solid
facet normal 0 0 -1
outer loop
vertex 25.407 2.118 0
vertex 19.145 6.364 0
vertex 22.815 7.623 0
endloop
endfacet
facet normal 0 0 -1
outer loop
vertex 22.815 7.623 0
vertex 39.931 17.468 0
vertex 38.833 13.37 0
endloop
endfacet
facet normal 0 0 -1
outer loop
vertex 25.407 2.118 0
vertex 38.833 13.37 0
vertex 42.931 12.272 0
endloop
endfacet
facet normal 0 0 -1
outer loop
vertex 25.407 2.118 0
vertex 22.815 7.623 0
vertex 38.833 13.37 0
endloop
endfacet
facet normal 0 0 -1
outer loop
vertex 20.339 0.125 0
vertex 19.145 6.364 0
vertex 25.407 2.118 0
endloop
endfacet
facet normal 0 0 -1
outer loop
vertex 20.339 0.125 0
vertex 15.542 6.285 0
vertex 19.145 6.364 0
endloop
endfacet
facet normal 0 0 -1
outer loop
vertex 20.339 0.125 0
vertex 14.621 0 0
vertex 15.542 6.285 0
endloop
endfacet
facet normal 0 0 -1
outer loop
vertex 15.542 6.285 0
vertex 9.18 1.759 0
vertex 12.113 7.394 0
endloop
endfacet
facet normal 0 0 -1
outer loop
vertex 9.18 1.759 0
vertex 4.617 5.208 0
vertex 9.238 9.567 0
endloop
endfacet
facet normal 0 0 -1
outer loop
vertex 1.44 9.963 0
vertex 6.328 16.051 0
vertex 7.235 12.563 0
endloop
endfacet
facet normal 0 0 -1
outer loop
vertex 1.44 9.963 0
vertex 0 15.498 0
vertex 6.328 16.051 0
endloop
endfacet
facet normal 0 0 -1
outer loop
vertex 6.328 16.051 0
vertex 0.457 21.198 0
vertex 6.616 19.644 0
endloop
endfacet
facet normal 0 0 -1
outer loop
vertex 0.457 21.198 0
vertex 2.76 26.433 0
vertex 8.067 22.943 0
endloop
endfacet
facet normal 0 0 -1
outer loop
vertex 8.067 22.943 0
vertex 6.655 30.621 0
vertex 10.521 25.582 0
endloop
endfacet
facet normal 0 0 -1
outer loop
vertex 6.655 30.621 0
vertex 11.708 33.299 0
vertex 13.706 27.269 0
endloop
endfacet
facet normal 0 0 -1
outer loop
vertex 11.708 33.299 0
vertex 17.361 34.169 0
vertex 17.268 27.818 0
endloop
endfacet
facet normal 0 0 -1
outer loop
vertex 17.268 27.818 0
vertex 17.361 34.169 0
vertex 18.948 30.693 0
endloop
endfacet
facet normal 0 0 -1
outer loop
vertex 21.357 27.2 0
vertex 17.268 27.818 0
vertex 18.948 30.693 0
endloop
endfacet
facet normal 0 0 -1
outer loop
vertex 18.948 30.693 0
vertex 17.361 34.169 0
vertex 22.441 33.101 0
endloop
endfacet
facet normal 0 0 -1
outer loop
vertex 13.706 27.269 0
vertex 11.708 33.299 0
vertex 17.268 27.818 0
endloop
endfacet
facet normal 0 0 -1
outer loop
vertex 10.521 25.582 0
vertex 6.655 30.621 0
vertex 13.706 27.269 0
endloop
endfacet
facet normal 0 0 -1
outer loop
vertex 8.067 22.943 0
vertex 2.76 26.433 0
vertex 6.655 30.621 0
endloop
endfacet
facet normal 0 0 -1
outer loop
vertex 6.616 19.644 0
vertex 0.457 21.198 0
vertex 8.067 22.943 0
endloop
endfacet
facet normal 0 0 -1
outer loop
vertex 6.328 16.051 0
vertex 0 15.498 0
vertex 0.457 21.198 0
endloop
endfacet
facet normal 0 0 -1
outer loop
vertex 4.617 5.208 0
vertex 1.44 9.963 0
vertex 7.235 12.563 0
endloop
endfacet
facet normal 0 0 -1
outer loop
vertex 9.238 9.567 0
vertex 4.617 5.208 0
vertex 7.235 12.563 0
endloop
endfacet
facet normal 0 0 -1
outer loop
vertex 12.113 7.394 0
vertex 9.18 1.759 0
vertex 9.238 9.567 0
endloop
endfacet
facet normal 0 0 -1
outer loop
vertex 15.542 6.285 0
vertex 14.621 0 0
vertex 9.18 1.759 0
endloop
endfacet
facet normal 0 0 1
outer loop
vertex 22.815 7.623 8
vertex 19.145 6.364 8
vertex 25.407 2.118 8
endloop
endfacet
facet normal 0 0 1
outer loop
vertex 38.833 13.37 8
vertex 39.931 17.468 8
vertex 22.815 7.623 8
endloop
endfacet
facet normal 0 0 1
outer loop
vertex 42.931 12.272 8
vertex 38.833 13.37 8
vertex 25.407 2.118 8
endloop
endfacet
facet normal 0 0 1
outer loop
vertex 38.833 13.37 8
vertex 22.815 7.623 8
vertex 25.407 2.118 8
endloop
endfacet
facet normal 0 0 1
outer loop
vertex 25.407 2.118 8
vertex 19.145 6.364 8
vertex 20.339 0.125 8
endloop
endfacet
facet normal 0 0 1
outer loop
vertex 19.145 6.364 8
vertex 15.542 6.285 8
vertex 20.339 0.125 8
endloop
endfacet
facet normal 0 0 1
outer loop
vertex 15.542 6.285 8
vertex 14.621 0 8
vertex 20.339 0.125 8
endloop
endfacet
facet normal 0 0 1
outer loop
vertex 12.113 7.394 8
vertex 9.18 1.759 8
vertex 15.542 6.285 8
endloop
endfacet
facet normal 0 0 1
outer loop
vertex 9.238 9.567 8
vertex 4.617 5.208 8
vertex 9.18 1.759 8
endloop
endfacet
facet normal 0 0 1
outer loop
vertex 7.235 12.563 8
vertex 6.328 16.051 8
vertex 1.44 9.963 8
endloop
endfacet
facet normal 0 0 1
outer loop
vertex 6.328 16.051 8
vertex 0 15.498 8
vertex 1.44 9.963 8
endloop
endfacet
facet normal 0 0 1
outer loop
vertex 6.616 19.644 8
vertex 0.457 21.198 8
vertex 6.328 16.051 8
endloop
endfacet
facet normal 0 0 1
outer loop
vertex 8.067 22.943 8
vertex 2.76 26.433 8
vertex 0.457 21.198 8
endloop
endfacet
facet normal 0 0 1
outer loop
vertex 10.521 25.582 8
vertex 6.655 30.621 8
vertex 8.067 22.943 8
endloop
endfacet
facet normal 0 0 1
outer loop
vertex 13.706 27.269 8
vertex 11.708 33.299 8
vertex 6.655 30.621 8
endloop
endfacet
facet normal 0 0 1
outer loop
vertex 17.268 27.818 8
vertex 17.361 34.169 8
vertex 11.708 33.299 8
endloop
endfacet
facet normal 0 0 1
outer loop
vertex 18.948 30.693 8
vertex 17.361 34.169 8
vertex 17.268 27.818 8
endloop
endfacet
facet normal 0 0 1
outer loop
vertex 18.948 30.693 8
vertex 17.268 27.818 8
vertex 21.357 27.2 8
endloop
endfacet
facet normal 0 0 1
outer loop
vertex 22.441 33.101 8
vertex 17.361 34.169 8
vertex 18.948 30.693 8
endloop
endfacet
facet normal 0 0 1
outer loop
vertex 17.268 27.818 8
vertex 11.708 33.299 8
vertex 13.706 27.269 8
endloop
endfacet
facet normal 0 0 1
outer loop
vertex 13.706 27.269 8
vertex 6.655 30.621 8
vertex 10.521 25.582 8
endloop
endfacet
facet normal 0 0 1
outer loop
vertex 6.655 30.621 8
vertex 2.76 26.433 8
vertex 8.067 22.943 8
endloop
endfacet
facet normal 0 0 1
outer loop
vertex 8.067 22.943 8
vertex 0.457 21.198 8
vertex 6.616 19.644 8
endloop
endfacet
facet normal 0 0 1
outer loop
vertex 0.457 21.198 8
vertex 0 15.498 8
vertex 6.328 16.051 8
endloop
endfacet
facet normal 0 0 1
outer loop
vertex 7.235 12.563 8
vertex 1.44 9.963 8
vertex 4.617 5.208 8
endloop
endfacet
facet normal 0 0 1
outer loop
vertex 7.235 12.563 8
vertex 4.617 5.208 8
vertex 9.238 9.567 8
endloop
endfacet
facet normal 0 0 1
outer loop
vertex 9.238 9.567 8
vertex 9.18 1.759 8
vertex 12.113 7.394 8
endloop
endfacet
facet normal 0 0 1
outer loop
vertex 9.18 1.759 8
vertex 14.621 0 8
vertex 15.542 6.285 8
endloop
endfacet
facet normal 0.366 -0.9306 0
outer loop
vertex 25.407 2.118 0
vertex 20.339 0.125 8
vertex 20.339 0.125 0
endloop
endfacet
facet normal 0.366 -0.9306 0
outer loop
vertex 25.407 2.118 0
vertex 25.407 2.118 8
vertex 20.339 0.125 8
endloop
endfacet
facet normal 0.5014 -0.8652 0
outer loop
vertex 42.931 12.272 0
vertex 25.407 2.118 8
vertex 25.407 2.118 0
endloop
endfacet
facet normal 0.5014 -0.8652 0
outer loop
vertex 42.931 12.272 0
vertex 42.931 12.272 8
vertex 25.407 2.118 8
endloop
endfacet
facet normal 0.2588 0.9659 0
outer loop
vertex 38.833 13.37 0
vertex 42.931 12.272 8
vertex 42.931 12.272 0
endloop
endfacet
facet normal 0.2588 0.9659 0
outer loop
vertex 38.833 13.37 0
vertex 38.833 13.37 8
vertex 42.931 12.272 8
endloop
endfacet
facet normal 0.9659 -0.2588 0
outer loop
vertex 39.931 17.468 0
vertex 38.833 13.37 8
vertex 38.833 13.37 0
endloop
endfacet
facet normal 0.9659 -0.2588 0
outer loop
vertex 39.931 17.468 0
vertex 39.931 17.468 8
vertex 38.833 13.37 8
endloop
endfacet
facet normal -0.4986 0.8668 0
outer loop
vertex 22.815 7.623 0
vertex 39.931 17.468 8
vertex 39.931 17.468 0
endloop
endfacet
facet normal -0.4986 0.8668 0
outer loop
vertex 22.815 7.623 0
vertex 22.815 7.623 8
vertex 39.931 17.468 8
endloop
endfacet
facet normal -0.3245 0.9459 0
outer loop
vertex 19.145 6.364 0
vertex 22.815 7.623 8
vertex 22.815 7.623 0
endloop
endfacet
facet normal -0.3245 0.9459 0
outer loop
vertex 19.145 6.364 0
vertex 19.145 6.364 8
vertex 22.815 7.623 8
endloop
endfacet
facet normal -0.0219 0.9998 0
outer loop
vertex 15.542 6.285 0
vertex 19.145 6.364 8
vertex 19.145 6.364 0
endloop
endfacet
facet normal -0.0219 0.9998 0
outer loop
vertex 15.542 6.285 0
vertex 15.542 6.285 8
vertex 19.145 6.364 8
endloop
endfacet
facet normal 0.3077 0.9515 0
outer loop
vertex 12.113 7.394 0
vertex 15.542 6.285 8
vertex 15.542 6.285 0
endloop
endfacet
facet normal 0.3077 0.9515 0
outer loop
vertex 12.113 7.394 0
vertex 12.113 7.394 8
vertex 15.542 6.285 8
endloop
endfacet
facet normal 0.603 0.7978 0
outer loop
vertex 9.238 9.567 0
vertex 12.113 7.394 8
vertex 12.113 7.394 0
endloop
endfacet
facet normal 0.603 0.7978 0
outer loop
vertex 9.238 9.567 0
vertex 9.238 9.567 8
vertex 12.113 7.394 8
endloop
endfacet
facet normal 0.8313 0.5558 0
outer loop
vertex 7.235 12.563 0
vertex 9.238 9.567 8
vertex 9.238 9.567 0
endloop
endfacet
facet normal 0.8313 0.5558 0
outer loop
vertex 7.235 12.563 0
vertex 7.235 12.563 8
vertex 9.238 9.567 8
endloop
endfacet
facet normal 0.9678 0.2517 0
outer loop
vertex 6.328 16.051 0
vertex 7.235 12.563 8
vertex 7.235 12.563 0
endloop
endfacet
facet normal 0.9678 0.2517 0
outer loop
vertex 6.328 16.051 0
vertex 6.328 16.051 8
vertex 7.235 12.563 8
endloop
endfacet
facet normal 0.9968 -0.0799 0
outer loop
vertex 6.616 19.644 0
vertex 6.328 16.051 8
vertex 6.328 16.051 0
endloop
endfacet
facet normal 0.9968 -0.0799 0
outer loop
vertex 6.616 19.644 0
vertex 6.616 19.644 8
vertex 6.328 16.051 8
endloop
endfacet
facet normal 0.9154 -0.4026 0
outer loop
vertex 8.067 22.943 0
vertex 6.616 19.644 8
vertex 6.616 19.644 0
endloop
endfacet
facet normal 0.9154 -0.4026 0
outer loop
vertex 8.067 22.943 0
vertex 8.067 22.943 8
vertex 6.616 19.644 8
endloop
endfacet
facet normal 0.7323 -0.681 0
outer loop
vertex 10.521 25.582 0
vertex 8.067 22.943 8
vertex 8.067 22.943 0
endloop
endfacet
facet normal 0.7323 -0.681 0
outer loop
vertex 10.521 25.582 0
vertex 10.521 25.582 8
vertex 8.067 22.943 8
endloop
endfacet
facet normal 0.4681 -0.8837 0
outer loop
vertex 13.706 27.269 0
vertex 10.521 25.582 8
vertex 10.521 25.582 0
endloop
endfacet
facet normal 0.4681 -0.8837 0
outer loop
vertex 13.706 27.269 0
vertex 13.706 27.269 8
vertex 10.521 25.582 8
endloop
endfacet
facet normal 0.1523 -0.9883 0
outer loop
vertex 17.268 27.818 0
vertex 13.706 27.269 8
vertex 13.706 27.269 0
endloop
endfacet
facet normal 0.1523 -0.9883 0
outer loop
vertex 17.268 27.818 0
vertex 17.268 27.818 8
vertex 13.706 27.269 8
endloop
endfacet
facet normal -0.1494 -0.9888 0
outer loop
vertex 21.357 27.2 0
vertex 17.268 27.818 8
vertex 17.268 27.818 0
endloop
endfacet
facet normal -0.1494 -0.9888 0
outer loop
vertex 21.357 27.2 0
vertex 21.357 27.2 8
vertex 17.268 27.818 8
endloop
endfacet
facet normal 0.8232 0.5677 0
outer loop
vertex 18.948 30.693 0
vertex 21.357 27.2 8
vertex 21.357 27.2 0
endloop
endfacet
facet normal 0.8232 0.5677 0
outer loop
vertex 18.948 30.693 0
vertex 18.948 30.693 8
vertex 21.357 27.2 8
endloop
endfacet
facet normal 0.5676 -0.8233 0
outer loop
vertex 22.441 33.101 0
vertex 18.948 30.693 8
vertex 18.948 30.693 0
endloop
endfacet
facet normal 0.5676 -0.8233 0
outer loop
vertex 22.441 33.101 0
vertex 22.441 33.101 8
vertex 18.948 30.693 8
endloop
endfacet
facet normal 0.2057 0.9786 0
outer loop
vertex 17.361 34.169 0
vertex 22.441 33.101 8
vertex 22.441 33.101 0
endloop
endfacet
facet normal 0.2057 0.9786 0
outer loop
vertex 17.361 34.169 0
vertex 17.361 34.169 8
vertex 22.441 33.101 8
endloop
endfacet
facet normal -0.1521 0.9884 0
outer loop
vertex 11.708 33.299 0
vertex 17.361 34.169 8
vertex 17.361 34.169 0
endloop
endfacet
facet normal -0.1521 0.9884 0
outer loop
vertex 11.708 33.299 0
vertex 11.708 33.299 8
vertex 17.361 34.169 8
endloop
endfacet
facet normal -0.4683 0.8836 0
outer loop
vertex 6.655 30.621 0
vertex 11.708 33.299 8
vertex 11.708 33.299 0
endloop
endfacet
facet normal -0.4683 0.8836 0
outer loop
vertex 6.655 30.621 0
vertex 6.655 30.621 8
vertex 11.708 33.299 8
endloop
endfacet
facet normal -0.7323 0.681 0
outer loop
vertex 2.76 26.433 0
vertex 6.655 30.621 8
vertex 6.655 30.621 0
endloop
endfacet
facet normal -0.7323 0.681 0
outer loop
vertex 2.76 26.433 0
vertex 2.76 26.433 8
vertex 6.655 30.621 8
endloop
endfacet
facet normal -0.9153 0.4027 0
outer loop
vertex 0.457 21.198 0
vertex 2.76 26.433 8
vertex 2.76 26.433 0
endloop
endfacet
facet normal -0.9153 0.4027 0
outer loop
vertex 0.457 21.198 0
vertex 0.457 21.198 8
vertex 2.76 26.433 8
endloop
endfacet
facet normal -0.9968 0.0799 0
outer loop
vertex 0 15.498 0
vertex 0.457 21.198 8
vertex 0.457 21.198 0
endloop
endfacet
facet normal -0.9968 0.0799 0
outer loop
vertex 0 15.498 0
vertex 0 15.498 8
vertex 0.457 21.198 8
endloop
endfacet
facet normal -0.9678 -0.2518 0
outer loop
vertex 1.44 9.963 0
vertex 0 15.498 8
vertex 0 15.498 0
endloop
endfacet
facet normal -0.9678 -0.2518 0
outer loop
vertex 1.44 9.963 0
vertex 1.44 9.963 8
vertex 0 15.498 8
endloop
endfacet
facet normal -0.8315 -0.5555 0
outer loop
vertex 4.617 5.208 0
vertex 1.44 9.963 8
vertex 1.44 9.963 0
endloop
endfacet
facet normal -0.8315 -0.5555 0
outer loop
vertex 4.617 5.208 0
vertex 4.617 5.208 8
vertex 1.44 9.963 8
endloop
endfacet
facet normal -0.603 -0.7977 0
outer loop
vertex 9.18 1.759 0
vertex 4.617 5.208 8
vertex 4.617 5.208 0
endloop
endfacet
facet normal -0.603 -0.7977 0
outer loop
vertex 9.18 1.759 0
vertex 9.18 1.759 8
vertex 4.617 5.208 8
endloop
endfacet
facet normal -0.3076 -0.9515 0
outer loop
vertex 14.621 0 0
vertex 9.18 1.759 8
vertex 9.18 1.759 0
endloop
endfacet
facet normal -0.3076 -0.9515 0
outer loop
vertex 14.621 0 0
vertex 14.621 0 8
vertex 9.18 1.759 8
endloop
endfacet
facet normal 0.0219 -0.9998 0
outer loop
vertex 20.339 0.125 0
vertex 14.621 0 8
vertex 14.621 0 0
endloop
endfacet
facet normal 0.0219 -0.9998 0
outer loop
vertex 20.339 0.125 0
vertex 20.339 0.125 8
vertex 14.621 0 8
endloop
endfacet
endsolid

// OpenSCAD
$fn = 32;

// ----------------------------------------------------------------------
// Eye lug: ring_tail, 8 mm thick
// ----------------------------------------------------------------------

// --- parameters (mm) ---
profile_height = 8;       // extrusion height
profile_points = 30;      // points of the closed outline

profile = [[18.948, 30.693], [22.441, 33.101], [17.361, 34.169], [11.708, 33.299], [6.655, 30.621], [2.76, 26.433], [0.457, 21.198], [0, 15.498], [1.44, 9.963], [4.617, 5.208], [9.18, 1.759], [14.621, 0], [20.339, 0.125], [25.407, 2.118], [42.931, 12.272], [38.833, 13.37], [39.931, 17.468], [22.815, 7.623], [19.145, 6.364], [15.542, 6.285], [12.113, 7.394], [9.238, 9.567], [7.235, 12.563], [6.328, 16.051], [6.616, 19.644], [8.067, 22.943], [10.521, 25.582], [13.706, 27.269], [17.268, 27.818], [21.357, 27.2]];  // single closed polygon, 30 points, counter clockwise

// --- the one profile operation ---
linear_extrude(height = profile_height) polygon(points = profile);
